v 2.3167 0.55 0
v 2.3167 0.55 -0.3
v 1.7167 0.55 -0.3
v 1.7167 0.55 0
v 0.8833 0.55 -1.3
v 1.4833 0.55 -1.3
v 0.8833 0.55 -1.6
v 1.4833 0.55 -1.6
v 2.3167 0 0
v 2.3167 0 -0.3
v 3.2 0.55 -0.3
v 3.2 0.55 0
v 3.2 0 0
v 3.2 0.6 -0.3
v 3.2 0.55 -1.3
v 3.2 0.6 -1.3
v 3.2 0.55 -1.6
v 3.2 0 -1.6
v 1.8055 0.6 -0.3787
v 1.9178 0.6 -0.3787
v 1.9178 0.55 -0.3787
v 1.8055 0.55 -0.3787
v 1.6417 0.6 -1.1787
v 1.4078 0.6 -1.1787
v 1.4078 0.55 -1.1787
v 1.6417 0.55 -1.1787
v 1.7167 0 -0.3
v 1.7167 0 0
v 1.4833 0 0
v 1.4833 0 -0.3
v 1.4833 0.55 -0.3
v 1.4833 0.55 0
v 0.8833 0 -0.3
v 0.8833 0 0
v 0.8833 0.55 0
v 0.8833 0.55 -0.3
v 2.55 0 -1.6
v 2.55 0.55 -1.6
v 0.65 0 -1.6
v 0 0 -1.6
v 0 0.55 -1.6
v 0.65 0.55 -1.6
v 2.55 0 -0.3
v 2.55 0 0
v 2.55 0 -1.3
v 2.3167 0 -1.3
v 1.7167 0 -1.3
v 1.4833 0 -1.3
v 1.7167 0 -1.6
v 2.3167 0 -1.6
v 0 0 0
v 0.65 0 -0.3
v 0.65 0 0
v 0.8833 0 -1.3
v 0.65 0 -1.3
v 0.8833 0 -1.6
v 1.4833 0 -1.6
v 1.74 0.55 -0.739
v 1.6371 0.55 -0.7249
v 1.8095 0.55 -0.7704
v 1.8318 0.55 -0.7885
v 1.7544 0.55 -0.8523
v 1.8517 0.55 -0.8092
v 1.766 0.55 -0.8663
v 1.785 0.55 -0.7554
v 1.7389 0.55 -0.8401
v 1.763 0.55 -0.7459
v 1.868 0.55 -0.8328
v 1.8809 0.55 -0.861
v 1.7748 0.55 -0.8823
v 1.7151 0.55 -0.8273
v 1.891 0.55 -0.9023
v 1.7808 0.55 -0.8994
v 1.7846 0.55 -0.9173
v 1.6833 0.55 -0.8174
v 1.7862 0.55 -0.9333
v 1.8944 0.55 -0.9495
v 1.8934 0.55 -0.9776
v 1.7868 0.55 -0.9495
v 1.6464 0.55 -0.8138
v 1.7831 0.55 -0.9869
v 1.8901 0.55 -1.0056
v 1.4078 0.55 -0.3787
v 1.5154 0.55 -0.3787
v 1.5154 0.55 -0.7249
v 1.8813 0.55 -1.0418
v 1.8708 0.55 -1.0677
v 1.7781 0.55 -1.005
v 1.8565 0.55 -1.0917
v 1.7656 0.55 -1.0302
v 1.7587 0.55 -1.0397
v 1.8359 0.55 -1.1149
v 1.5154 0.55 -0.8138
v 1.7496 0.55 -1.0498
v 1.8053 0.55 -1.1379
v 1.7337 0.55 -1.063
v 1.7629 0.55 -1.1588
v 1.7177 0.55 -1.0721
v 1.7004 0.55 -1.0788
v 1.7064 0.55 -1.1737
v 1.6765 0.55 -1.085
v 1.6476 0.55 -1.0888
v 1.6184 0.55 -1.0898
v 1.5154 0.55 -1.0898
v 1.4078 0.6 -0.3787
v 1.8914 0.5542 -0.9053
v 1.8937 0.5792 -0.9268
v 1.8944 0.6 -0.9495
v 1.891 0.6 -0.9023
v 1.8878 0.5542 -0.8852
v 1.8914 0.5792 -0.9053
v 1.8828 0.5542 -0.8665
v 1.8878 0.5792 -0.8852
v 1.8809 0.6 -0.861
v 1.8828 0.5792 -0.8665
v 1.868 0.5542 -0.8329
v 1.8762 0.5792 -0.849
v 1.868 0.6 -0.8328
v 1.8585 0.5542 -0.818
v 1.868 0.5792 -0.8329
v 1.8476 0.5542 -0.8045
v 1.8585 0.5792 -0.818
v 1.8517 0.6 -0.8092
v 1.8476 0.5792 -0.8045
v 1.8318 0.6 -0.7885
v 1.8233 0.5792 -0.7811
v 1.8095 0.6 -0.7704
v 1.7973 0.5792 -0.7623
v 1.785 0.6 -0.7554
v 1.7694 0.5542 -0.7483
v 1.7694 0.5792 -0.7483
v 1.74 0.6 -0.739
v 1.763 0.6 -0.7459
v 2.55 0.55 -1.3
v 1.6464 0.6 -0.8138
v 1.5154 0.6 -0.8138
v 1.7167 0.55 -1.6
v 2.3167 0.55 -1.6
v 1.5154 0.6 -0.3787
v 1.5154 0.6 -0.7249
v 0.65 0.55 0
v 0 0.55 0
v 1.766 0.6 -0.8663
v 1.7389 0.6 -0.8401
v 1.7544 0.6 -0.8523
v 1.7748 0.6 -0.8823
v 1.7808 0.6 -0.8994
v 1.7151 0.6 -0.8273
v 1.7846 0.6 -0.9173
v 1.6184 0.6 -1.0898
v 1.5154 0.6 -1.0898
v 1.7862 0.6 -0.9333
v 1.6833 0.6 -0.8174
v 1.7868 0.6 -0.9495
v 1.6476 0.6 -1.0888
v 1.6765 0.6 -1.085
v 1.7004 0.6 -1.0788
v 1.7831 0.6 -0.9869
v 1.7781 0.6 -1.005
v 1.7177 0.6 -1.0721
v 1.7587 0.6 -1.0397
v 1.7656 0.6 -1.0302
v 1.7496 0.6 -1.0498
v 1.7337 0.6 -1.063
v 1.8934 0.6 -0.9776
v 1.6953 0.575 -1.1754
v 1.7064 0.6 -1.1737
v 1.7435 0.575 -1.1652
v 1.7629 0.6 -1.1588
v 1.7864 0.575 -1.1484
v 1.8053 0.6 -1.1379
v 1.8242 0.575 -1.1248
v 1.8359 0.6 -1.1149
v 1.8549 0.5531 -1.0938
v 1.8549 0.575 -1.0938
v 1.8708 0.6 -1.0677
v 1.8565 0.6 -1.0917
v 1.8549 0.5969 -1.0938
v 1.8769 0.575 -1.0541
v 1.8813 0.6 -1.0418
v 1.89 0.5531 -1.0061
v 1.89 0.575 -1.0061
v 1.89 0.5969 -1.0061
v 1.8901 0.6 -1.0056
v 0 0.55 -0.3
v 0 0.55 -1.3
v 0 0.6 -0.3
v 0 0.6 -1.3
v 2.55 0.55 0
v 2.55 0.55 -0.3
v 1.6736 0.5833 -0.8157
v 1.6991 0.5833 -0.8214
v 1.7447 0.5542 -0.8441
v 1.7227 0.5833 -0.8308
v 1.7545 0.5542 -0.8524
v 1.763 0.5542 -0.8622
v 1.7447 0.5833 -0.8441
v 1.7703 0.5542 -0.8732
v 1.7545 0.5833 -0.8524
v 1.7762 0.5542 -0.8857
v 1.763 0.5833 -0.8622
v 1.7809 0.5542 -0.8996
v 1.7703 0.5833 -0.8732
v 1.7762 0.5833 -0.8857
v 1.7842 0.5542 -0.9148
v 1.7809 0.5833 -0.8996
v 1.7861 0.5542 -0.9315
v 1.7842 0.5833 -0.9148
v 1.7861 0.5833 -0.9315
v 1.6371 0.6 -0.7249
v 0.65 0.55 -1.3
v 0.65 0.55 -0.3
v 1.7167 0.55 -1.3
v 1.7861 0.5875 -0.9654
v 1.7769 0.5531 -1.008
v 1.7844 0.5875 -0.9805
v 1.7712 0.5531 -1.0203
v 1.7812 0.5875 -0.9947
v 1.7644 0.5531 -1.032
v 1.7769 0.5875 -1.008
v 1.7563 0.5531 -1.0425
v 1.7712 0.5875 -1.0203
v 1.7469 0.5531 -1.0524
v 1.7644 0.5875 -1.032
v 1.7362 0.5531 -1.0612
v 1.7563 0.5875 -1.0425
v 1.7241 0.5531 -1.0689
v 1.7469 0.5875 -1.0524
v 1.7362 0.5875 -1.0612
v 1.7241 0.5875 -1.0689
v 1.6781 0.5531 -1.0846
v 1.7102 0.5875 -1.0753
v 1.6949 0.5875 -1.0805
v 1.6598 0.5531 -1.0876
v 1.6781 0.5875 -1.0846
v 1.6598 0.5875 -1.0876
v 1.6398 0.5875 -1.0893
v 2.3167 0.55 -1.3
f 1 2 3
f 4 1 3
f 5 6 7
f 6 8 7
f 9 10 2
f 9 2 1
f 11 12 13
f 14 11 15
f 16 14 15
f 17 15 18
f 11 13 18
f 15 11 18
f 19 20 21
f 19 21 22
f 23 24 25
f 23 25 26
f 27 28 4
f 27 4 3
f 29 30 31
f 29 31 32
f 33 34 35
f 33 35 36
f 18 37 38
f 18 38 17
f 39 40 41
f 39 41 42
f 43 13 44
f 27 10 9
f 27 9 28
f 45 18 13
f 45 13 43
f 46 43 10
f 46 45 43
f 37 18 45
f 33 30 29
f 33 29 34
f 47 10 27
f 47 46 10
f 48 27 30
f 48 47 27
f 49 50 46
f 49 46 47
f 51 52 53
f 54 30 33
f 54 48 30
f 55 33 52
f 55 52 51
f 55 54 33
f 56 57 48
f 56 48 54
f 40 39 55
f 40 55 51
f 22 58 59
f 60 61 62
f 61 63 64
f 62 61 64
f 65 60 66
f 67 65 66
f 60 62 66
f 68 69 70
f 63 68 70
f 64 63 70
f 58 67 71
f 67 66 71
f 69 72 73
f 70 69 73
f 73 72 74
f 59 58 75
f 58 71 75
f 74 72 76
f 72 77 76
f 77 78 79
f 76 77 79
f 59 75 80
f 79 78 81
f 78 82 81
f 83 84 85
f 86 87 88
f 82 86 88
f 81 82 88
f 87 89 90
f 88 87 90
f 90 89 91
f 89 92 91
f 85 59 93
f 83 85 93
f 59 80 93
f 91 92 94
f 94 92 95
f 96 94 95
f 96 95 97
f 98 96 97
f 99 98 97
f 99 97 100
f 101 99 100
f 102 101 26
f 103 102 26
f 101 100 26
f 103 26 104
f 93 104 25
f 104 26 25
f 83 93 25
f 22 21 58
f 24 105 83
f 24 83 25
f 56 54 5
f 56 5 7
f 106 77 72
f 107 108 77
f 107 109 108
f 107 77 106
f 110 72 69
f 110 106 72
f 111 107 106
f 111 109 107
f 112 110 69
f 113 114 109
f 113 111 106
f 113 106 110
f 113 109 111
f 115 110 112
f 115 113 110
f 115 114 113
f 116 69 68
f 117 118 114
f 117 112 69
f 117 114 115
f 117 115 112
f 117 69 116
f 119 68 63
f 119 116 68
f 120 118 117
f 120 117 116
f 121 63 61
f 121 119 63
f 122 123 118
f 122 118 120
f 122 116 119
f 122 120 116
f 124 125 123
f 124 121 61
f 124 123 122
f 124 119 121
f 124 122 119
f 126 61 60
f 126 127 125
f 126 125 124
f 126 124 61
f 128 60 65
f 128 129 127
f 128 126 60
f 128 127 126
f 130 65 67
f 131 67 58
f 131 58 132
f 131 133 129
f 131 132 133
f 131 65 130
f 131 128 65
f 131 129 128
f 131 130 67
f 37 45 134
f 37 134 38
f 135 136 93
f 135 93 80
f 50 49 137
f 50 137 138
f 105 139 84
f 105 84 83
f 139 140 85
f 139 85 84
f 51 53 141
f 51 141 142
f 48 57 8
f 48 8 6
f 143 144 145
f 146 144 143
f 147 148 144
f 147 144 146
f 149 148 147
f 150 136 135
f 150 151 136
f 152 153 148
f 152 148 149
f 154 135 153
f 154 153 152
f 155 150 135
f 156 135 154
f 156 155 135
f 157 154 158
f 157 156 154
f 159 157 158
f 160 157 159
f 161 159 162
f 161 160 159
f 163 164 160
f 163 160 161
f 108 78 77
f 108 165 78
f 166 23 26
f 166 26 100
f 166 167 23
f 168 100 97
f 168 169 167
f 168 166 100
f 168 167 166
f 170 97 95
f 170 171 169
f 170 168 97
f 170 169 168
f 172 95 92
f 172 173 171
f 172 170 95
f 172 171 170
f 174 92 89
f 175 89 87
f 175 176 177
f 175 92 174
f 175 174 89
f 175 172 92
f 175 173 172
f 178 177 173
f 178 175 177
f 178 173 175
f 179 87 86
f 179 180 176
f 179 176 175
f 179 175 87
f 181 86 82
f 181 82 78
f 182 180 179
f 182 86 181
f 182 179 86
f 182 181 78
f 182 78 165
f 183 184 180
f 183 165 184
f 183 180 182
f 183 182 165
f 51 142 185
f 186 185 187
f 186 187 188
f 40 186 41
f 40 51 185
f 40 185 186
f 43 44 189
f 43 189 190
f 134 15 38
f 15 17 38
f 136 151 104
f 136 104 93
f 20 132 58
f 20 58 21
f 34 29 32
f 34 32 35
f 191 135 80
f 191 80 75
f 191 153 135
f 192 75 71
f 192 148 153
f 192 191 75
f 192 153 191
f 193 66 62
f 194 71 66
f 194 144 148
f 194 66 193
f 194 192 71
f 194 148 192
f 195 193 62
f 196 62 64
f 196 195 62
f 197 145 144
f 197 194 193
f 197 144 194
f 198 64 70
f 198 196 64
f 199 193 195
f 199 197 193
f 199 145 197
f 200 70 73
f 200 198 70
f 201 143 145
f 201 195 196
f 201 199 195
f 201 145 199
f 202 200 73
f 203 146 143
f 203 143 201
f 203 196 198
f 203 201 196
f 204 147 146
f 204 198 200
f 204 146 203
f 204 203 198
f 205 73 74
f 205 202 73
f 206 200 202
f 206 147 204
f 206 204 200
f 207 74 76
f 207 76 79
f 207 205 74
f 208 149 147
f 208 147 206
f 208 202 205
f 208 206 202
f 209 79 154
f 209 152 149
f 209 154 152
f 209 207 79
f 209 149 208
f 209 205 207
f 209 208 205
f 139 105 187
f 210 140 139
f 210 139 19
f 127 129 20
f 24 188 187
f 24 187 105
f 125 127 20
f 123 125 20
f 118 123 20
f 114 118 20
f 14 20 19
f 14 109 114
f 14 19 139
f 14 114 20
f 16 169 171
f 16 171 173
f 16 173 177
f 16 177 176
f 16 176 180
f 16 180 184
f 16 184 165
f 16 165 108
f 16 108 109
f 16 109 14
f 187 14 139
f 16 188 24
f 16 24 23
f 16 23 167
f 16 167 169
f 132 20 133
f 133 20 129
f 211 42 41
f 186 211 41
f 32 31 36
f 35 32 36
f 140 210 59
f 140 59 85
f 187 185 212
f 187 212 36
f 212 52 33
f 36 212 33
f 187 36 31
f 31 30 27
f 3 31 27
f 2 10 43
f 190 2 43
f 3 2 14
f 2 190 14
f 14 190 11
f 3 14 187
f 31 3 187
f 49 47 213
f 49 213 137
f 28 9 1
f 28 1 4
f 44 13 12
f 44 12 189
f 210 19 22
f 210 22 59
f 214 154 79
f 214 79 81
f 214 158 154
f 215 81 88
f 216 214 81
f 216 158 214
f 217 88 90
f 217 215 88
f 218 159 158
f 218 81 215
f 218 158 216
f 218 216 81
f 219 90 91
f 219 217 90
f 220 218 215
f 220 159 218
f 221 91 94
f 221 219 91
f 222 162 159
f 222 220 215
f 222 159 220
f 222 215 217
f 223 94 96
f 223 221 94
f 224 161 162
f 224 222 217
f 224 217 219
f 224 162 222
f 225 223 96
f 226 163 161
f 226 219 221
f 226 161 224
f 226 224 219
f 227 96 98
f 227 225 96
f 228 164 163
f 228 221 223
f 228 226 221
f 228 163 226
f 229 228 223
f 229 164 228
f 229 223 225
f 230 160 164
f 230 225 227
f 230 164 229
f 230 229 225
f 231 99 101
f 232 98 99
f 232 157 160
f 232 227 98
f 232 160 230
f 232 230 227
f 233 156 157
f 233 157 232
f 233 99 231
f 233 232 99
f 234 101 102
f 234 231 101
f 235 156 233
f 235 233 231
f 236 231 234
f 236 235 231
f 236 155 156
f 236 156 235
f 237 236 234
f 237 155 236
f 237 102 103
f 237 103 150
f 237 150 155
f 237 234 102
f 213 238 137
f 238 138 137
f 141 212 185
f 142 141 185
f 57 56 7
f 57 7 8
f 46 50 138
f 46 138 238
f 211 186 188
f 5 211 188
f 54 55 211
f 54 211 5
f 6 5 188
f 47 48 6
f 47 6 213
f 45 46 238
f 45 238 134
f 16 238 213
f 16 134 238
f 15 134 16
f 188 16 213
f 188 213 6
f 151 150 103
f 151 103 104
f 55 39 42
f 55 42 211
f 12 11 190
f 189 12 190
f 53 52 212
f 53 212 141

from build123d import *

# Parameters (mm, degrees)
EXTRUDE_1_DEPTH     = 0.55
SKETCH_2_W          = 3.2
SKETCH_2_H          = 1
EXTRUDE_2_DEPTH     = 0.05
CUT_EXTRUDE_1_DEPTH = 0.05


with BuildPart() as part:
    # 草图1 → 凸台-拉伸1 (new body)
    with BuildSketch(Plane(origin=(0, 0, 0), x_dir=(1, 0, 0), z_dir=(0, 1, 0))):
        Polygon((0, 1.6), (0.65, 1.6), (0.65, 1.3), (0.883333333, 1.3), (0.883333333, 1.6), (1.483333333, 1.6), (1.483333333, 1.3), (1.716666667, 1.3), (1.716666667, 1.6), (2.316666667, 1.6), (2.316666667, 1.3), (2.55, 1.3), (2.55, 1.6), (3.2, 1.6), (3.2, 0), (2.55, 0), (2.55, 0.3), (2.316666667, 0.3), (2.316666667, 0), (1.716666667, 0), (1.716666667, 0.3), (1.483333333, 0.3), (1.483333333, 0), (0.883333333, 0), (0.883333333, 0.3), (0.65, 0.3), (0.65, 0), (0, 0), align=None)
    extrude(amount=EXTRUDE_1_DEPTH)

    # 草图2 → 凸台-拉伸2 (add)
    with BuildSketch(Plane(origin=(0, 0.55, 0), x_dir=(1, 0, 0), z_dir=(0, 1, 0))):
        with Locations((1.6, 0.8)):
            Rectangle(SKETCH_2_W, SKETCH_2_H)
    extrude(amount=EXTRUDE_2_DEPTH)

    # 草图3 → 切除-拉伸1 (cut)
    with BuildSketch(Plane(origin=(0, 0.6, 0), x_dir=(1, 0, 0), z_dir=(0, 1, 0))):
        with BuildLine():
            Line((1.917771118, 0.378720107), (1.805490417, 0.378720107))
            Line((1.805490417, 0.378720107), (1.637069364, 0.724918938))
            Line((1.637069364, 0.724918938), (1.515431937, 0.724918938))
            Line((1.515431937, 0.724918938), (1.515431937, 0.378720107))
            Line((1.515431937, 0.378720107), (1.407829598, 0.378720107))
            Line((1.407829598, 0.378720107), (1.407829598, 1.178720107))
            Line((1.407829598, 1.178720107), (1.641747727, 1.178720107))
            add(Edge.make_bspline(
                [(1.641747727, 1.178720107), (1.650877695, 1.178538996), (1.668766176, 1.178184141), (1.694966708, 1.175841662), (1.719794447, 1.171455671), (1.743299904, 1.165540709), (1.765609593, 1.158227469), (1.786446266, 1.148709415), (1.806131061, 1.137846554), (1.824414613, 1.12520671), (1.840963489, 1.110686573), (1.855451783, 1.093952759), (1.867498892, 1.074984486), (1.877520178, 1.053940121), (1.88499041, 1.030775188), (1.890598625, 1.005556873), (1.893854462, 0.978213639), (1.894200851, 0.95925007), (1.894379305, 0.949480341)],
                knots=[0, 0, 0, 0, 1.124851401, 2.203938021, 3.236923468, 4.227547377, 5.188384515, 6.124748074, 7.04535131, 7.955333121, 8.85768773, 9.750678987, 10.67246398, 11.61778816, 12.61462837, 13.664292026, 14.796680505, 16, 16, 16, 16], degree=3))
            add(Edge.make_bspline(
                [(1.894379305, 0.949480341), (1.894269052, 0.941907793), (1.894053913, 0.927131409), (1.891724054, 0.905649007), (1.888142619, 0.885479601), (1.883132103, 0.866607441), (1.876594297, 0.849035527), (1.868343074, 0.83283863), (1.858862404, 0.817841976), (1.844321779, 0.800072595), (1.82423859, 0.780839953), (1.798018465, 0.761803212), (1.769905791, 0.747375988), (1.749929671, 0.741751637), (1.739993341, 0.738954025)],
                knots=[0, 0, 0, 0, 0.960252019, 1.873748618, 2.737466876, 3.556786617, 4.347431233, 5.110891588, 5.858830743, 6.593445102, 8.018399741, 9.372640647, 10.693124067, 12, 12, 12, 12], degree=3))
            Line((1.739993341, 0.738954025), (1.917771118, 0.378720107))
        make_face()
        with BuildLine():
            add(Edge.make_bspline(
                [(1.786776966, 0.949480341), (1.786616632, 0.954797225), (1.786303824, 0.965170359), (1.784660338, 0.980337294), (1.781467707, 0.99458464), (1.777268036, 1.008028632), (1.771328911, 1.02037339), (1.76473626, 1.032129453), (1.756358735, 1.042713613), (1.747065289, 1.052698073), (1.736238719, 1.061559987), (1.723933352, 1.069310308), (1.710025407, 1.075629695), (1.694620701, 1.080805183), (1.677765468, 1.084976529), (1.659330804, 1.087850267), (1.639356253, 1.089600193), (1.625521683, 1.089752388), (1.618355914, 1.089831218)],
                knots=[0, 0, 0, 0, 1.018423225, 1.986923476, 2.915383729, 3.810714658, 4.676600435, 5.533969095, 6.385612358, 7.253966558, 8.141821118, 9.056210967, 10.031005151, 11.059229177, 12.164336364, 13.351610032, 14.628236891, 16, 16, 16, 16], degree=3))
            Line((1.618355914, 1.089831218), (1.515431937, 1.089831218))
            Line((1.515431937, 1.089831218), (1.515431937, 0.813807827))
            Line((1.515431937, 0.813807827), (1.646426089, 0.813807827))
            add(Edge.make_bspline(
                [(1.646426089, 0.813807827), (1.655526373, 0.814152608), (1.673338014, 0.814827436), (1.699062289, 0.820748228), (1.723081192, 0.830209359), (1.741484495, 0.841236085), (1.754801333, 0.852177002), (1.763336542, 0.862083437), (1.770701163, 0.873229329), (1.776545906, 0.885883061), (1.781260065, 0.899810048), (1.784494681, 0.915162638), (1.786369818, 0.931875195), (1.786637933, 0.943468538), (1.786776966, 0.949480341)],
                knots=[0, 0, 0, 0, 1.47184772, 2.880791526, 4.249240139, 5.638178403, 6.335067569, 7.030952029, 7.746845966, 8.491482783, 9.28109559, 10.123026367, 11.02668324, 12, 12, 12, 12], degree=3))
        make_face(mode=Mode.SUBTRACT)
    extrude(amount=-CUT_EXTRUDE_1_DEPTH, mode=Mode.SUBTRACT)


solid = part.part
